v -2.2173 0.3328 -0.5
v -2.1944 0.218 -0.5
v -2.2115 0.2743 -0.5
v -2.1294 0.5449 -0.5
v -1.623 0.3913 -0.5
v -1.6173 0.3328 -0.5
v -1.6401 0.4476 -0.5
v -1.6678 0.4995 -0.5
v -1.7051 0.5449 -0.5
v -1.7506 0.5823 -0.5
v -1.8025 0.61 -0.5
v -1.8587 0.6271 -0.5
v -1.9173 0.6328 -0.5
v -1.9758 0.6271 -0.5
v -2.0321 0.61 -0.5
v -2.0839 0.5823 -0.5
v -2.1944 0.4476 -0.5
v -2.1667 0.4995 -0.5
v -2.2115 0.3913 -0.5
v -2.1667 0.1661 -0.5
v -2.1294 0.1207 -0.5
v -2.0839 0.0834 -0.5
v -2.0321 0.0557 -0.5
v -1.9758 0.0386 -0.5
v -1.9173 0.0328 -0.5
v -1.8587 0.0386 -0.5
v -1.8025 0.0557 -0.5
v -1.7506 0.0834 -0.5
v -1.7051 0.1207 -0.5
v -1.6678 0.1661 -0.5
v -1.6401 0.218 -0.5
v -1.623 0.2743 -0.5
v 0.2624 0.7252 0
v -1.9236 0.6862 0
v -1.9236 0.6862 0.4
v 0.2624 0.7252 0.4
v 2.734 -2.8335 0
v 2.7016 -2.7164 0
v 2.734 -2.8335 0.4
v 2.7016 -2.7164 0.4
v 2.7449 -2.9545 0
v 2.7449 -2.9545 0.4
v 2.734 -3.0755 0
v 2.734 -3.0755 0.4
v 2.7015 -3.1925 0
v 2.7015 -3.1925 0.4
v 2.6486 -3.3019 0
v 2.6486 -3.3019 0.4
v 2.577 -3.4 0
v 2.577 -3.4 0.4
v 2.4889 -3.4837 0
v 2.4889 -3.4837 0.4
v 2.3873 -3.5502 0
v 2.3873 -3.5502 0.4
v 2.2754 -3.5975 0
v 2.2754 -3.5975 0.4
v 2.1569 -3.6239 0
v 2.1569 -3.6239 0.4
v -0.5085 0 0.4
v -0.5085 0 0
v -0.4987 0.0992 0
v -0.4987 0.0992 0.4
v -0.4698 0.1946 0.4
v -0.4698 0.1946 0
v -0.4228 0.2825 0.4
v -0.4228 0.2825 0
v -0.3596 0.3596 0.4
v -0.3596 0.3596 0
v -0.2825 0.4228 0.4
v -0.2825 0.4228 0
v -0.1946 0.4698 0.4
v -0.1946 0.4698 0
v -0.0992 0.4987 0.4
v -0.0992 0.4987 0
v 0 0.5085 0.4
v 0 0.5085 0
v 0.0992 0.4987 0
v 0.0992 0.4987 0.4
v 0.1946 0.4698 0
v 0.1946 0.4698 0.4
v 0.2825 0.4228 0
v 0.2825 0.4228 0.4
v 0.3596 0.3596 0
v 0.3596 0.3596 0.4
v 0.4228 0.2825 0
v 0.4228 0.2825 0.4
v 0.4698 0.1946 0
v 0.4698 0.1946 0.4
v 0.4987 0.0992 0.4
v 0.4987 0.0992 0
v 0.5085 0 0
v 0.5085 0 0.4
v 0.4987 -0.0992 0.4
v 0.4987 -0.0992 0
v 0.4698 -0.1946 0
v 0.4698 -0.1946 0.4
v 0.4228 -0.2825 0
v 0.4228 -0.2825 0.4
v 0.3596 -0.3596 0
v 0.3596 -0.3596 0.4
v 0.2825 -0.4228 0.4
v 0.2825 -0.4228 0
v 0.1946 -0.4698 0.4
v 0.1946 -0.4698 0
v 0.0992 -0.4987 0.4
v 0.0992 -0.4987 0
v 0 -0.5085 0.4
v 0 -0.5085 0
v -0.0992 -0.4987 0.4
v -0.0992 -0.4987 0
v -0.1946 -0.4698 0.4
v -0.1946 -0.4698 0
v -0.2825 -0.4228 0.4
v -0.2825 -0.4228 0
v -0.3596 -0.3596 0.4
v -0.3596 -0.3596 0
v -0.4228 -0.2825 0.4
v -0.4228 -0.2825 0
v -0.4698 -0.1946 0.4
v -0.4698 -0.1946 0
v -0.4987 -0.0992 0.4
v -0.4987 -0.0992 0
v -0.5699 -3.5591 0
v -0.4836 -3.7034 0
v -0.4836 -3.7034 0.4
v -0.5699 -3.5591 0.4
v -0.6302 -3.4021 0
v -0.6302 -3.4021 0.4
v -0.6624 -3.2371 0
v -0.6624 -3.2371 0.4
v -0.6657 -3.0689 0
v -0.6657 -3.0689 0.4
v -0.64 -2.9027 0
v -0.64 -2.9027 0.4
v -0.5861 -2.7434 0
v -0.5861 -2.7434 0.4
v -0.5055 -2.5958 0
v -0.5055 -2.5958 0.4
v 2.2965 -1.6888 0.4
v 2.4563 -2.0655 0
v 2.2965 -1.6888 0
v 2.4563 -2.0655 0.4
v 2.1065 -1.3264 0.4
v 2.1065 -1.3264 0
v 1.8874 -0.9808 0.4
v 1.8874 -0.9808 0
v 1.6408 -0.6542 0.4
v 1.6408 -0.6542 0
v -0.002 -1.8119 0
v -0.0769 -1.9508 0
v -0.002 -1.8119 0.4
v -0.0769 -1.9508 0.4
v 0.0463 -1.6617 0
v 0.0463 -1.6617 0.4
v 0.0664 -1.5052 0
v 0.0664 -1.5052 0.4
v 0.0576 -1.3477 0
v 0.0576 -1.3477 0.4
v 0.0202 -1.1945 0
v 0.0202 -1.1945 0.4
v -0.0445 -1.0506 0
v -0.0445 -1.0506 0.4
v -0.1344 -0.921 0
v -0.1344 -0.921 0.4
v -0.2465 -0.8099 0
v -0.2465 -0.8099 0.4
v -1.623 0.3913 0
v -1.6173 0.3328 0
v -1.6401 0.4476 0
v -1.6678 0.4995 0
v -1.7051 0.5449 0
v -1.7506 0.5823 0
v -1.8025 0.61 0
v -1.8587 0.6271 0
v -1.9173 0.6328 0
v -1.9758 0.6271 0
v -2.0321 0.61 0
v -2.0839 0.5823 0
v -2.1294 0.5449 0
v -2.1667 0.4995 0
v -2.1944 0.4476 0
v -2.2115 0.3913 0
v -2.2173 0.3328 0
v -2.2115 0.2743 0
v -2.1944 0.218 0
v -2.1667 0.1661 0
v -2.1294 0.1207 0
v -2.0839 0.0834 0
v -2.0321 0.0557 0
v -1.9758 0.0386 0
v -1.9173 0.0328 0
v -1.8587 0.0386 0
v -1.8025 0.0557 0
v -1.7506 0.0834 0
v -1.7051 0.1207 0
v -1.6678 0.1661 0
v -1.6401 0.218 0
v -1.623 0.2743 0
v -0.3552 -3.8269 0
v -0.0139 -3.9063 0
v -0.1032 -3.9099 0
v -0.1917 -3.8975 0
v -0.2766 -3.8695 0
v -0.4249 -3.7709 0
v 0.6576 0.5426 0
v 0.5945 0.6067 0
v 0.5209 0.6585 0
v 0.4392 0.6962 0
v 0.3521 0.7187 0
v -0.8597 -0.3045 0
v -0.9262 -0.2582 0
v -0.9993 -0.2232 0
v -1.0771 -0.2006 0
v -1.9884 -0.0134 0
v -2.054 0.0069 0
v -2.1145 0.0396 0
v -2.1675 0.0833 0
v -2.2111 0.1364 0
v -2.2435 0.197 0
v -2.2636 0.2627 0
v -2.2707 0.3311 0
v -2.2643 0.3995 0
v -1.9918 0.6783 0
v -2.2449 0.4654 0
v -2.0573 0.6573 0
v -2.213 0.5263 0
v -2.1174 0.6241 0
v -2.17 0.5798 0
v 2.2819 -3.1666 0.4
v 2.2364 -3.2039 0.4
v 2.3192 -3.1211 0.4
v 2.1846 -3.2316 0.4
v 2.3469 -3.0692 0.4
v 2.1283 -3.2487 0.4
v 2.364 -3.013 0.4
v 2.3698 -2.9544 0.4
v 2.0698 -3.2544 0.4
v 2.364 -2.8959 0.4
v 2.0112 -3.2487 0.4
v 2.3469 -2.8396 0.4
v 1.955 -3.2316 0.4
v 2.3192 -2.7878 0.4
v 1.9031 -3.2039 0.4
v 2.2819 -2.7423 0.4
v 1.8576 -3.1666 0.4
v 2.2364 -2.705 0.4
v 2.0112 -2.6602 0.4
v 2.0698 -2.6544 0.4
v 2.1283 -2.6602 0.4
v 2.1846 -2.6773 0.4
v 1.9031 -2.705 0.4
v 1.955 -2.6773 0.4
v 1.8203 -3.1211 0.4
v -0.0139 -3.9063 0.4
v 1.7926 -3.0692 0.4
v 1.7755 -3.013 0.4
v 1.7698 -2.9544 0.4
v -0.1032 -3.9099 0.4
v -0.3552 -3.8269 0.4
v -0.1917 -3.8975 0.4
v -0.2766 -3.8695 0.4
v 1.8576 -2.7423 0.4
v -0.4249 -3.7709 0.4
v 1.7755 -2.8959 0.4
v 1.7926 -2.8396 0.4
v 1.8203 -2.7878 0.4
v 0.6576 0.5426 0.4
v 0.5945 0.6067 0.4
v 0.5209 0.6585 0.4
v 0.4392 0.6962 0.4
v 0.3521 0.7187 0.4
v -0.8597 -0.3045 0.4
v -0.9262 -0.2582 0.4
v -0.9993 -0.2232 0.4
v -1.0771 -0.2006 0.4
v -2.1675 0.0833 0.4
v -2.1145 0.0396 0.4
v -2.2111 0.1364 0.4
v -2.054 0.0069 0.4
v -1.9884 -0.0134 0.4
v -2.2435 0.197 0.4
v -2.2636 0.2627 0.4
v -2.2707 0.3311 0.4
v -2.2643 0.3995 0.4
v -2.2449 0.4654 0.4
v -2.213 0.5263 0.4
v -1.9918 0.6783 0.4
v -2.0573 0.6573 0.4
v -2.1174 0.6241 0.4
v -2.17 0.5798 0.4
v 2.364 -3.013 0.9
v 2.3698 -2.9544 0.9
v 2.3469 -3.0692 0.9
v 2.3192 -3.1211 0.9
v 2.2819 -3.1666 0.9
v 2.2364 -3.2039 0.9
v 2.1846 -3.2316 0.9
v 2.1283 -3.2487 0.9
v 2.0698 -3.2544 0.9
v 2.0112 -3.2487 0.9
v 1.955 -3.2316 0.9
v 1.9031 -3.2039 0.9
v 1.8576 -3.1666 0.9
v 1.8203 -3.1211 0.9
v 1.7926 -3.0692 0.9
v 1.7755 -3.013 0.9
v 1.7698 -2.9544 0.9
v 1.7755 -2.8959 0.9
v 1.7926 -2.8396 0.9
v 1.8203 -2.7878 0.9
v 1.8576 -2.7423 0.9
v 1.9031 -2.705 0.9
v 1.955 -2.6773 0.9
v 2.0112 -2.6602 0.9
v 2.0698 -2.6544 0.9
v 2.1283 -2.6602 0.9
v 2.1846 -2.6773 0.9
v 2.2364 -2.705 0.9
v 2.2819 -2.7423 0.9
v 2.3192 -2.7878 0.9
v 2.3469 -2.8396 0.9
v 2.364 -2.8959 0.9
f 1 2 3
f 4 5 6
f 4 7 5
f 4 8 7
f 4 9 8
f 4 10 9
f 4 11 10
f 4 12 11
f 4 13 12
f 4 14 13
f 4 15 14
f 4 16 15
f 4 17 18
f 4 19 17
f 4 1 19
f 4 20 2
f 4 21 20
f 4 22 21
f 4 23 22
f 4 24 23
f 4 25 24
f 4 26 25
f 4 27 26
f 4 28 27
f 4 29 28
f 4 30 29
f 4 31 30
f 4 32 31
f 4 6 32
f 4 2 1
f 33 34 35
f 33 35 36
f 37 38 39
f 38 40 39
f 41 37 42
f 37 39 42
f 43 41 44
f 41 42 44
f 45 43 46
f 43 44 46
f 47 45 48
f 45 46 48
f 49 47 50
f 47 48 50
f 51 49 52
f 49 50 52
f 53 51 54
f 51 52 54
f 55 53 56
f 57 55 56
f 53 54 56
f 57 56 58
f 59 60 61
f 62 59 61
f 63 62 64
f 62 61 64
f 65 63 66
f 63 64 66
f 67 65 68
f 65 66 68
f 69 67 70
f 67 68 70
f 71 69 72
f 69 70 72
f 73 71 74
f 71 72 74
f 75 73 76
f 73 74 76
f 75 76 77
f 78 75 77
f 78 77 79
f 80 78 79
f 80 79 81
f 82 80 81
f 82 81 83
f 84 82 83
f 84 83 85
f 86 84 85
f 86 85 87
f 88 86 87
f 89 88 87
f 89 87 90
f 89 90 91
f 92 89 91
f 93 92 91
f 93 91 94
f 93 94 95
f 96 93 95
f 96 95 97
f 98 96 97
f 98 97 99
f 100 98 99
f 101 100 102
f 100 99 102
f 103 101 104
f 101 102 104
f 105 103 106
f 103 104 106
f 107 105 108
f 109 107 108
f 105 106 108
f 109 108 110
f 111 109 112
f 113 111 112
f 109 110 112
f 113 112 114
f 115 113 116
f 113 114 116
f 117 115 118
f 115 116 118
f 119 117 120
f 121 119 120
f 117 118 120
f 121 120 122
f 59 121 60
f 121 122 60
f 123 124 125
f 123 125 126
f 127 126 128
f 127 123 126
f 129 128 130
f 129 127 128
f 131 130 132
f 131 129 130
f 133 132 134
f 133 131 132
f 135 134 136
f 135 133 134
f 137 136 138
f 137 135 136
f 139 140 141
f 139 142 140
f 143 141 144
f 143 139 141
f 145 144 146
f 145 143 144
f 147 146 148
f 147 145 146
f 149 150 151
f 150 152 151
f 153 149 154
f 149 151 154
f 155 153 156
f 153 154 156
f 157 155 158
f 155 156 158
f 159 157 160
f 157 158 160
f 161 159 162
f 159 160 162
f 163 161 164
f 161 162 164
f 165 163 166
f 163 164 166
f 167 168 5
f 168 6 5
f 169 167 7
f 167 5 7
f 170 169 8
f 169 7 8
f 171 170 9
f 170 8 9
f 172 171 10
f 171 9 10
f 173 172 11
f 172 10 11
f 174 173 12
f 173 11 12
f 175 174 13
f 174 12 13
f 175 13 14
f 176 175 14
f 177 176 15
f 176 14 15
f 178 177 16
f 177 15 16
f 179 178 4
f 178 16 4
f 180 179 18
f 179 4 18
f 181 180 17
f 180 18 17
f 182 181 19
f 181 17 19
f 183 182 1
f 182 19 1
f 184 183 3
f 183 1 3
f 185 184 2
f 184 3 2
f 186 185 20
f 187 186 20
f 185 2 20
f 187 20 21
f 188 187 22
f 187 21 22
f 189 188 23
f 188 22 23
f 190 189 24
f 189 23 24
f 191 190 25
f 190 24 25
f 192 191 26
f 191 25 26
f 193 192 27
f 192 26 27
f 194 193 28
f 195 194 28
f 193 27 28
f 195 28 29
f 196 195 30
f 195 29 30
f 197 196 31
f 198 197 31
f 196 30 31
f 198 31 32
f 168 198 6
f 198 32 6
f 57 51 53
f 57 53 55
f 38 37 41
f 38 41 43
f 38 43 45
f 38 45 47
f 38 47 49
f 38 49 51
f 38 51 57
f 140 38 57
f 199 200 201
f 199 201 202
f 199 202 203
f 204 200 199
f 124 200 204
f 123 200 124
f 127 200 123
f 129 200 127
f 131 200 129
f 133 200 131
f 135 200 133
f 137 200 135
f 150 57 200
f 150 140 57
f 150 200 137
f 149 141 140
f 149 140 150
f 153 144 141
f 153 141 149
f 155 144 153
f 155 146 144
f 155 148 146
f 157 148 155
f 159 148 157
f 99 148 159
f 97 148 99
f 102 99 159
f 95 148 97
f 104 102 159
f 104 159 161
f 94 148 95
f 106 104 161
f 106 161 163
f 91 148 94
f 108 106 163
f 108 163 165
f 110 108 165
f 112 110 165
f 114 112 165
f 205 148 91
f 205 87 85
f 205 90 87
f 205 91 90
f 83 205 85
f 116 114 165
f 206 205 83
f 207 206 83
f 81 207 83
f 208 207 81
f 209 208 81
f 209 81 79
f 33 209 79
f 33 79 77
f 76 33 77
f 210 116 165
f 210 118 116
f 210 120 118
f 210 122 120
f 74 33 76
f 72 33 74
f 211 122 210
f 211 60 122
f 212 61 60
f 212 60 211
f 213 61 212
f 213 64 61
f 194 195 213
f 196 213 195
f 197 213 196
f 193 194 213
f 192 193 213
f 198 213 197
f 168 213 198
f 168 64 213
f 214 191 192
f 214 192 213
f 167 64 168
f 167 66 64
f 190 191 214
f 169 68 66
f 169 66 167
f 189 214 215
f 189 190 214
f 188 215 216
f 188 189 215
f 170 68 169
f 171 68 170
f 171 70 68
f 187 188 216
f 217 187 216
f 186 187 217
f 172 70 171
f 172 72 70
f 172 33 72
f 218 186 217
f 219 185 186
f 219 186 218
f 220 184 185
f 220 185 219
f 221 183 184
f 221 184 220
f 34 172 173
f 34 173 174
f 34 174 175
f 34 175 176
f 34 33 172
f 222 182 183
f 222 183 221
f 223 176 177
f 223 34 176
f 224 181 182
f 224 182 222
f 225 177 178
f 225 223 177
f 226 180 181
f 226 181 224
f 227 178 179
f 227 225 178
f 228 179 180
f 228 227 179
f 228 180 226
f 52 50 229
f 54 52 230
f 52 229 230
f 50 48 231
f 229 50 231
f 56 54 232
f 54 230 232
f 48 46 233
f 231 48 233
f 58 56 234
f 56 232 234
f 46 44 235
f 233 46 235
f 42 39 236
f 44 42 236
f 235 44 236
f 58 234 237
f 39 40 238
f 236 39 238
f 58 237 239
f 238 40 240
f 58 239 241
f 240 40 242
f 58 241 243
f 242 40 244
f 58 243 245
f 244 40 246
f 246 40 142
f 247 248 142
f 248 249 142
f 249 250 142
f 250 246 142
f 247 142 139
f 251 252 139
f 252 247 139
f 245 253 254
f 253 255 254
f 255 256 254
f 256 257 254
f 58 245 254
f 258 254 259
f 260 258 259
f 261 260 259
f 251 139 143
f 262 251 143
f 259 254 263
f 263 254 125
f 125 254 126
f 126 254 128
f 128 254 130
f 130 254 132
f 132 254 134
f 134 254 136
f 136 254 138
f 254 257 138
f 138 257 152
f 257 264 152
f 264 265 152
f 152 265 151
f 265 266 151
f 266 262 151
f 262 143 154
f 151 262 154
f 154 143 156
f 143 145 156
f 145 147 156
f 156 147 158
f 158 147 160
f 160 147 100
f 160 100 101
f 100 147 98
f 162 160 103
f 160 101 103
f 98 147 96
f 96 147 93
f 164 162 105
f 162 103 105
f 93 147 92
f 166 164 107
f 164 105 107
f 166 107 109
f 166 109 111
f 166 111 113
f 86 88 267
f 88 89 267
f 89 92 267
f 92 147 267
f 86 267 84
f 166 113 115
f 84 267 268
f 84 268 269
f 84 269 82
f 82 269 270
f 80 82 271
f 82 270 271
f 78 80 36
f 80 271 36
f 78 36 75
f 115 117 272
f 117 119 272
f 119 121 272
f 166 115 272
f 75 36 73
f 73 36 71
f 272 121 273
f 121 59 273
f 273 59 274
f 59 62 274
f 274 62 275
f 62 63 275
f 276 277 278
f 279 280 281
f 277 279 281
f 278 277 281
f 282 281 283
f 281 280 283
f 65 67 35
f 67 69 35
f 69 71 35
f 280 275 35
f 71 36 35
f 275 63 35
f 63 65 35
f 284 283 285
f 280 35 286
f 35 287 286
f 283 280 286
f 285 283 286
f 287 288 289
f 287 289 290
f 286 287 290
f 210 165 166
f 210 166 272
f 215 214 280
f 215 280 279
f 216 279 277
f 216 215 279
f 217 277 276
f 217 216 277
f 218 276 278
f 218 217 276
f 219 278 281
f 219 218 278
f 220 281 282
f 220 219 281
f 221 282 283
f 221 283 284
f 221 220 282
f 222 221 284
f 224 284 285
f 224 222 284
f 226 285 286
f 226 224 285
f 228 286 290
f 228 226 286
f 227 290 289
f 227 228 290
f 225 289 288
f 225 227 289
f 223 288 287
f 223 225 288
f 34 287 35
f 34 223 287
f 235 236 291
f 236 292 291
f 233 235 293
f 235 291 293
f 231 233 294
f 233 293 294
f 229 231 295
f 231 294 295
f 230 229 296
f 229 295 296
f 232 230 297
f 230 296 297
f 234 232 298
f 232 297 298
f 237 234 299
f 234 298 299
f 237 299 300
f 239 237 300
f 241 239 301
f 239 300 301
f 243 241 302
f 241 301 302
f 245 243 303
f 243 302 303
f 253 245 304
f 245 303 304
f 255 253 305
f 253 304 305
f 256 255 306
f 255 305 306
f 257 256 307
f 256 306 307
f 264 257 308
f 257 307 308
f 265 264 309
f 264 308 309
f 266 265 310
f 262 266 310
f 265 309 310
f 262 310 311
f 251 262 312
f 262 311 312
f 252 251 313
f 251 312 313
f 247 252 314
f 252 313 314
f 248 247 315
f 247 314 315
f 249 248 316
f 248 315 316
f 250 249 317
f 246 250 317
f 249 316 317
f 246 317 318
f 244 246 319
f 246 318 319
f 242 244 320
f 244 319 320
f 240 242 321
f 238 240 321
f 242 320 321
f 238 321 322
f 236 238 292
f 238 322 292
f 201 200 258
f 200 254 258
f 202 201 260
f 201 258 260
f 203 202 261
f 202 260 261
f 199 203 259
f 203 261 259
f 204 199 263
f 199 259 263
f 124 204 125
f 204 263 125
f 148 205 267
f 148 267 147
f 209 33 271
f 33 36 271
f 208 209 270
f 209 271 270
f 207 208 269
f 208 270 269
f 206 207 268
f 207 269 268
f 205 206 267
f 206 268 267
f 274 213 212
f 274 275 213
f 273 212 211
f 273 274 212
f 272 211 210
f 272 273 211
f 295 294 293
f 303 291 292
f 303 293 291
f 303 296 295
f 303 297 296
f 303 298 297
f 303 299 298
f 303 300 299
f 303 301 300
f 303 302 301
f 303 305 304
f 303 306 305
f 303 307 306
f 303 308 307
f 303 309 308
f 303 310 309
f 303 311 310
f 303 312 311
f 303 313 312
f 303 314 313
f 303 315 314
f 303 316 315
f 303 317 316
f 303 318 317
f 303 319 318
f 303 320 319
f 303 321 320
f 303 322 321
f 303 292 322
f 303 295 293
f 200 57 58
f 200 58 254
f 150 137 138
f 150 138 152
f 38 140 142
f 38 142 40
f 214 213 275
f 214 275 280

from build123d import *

# Parameters (mm, degrees)
BOSS_EXTRUDE1_DEPTH = 0.4
SKETCH2_W           = 0.3
SKETCH2_H           = 0.5
SKETCH3_W           = 0.3
SKETCH3_H           = 0.5
HOLE1_D             = 1.0170144
HOLE1_DEPTH         = 0.9
FILLET1_R           = 0.5
FILLET2_R           = 0.675116289
FILLET3_R           = 0.860966661
FILLET4_R           = 5


with BuildPart() as part:
    # Sketch1 → Boss-Extrude1 (new body)
    with BuildSketch(Plane(origin=(0, 0, 0), x_dir=(-1, 0, 0), z_dir=(0, 0, -1))):
        with BuildLine():
            Line((1.92357438, 0.686162269), (-0.504151468, 0.729490315))
            Line((-0.504151468, 0.729490315), (-2.165159681, -1.292473972))
            Line((-2.165159681, -1.292473972), (-3.001972093, -3.513959355))
            Line((-3.001972093, -3.513959355), (0.244519319, -3.936309209))
            ThreePointArc((0.244519319, -3.936309209), (0.65000118, -3.31960662), (0.50548708, -2.595829516))
            Line((0.50548708, -2.595829516), (-0.352902824, -1.303839102))
            Line((-0.352902824, -1.303839102), (0.955537124, -0.225531852))
            Line((0.955537124, -0.225531852), (1.988382035, -0.013355626))
            ThreePointArc((1.988382035, -0.013355626), (2.269162736, 0.365418669), (1.92357438, 0.686162269))
        make_face()
    extrude(amount=-BOSS_EXTRUDE1_DEPTH)

    # Sketch2 → Revolve1 (revolve)
    with BuildSketch(Plane.XZ.offset(2.954427416)):
        with Locations((2.219775702, 0.65)):
            Rectangle(SKETCH2_W, SKETCH2_H)
    revolve(axis=Axis((2.069775702, -2.954427416, 0.9), (0, 0, -1)))

    # Sketch3 → Revolve2 (revolve)
    with BuildSketch(Plane(origin=(0, 0.332816985, 0), x_dir=(1, 0, 0), z_dir=(0, 1, 0))):
        with Locations((-1.767268165, 0.25)):
            Rectangle(SKETCH3_W, SKETCH3_H)
    revolve(axis=Axis((-1.917268165, 0.332816985, -0.5), (0, 0, 1)))

    # Hole1
    with Locations(Plane.XY.offset(0.4)):
        with Locations((0, 0)):
            Hole(HOLE1_D / 2, depth=HOLE1_DEPTH)

    # Fillet1
    fillet1_edges = [part.edges().sort_by_distance(p)[0] for p in [
        (-0.955537124, -0.225531852, 0.2),
        (-0.244519319, -3.936309209, 0.2),
        (0.504151468, 0.729490315, 0.2),
    ]]
    fillet(fillet1_edges, radius=FILLET1_R)

    # Fillet2
    fillet2_edges = [part.edges().sort_by_distance(p)[0] for p in [
        (3.001972093, -3.513959355, 0.2),
    ]]
    fillet(fillet2_edges, radius=FILLET2_R)

    # Fillet3
    fillet3_edges = [part.edges().sort_by_distance(p)[0] for p in [
        (0.352902824, -1.303839102, 0.2),
    ]]
    fillet(fillet3_edges, radius=FILLET3_R)

    # Fillet4
    fillet4_edges = [part.edges().sort_by_distance(p)[0] for p in [
        (2.165159681, -1.292473972, 0.2),
    ]]
    fillet(fillet4_edges, radius=FILLET4_R)


solid = part.part
